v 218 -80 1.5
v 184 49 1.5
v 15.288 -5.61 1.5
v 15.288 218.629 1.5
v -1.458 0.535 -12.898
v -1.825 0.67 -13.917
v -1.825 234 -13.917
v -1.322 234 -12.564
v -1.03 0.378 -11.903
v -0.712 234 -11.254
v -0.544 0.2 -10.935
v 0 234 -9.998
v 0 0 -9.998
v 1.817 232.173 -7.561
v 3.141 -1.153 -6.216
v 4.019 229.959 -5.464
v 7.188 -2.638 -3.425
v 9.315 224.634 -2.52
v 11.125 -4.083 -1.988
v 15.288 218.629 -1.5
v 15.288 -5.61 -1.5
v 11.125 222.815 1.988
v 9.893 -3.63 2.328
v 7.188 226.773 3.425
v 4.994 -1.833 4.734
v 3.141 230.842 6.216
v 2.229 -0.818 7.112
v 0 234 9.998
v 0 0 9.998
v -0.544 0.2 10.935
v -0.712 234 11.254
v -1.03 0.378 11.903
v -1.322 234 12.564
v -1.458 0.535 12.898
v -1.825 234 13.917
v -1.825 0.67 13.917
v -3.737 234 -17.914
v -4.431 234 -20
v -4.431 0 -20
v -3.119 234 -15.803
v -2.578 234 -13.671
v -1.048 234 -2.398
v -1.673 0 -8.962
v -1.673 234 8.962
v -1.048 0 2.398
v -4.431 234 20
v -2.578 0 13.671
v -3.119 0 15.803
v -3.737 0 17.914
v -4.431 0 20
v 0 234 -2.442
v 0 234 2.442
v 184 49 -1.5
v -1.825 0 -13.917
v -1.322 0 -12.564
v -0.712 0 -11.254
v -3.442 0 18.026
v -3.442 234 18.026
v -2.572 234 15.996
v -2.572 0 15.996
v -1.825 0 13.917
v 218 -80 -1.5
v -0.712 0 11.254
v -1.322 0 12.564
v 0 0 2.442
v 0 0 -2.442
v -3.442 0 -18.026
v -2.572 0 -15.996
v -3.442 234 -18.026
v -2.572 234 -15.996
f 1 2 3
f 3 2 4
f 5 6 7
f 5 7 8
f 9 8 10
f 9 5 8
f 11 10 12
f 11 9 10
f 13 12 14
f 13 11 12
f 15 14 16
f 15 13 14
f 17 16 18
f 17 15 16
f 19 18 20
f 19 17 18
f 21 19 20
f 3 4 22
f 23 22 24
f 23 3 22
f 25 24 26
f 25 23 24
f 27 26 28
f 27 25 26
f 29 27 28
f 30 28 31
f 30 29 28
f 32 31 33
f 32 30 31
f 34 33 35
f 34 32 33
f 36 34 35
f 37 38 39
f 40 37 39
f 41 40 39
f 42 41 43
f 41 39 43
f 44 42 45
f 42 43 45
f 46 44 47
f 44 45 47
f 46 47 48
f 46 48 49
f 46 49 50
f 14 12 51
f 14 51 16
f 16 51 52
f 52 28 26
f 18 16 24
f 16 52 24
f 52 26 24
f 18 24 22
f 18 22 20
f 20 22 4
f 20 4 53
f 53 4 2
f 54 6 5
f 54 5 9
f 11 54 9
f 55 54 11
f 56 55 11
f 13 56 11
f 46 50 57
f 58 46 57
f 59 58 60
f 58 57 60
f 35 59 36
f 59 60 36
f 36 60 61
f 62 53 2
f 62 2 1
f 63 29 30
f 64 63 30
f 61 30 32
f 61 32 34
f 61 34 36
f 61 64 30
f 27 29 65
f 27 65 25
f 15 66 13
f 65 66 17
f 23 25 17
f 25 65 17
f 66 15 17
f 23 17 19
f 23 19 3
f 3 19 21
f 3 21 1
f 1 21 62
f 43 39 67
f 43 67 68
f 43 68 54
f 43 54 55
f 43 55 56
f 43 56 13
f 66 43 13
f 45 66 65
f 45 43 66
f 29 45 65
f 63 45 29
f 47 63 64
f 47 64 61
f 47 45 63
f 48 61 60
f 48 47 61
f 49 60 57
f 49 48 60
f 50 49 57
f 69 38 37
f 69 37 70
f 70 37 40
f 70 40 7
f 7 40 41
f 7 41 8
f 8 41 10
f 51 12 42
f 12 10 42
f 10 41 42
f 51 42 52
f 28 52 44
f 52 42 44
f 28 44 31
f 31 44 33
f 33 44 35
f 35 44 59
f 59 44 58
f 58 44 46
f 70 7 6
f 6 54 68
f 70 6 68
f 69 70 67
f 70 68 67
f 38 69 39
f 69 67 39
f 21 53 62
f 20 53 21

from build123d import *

# Parameters (mm, degrees)
BOSS_EXTRUDE1_DEPTH      = 1.5
BOSS_EXTRUDE1_DEPTH_BACK = 1.5
BOSS_EXTRUDE2_DEPTH      = 234
FILLET1_R                = 37
FILLET2_R                = 37
FILLET3_R                = 18
FILLET4_R                = 18


with BuildPart() as part:
    # Sketch1 → Boss-Extrude1 (new, two sides: drawn at the far end of the back side and taken through both)
    with BuildSketch(Plane.XY.offset(-BOSS_EXTRUDE1_DEPTH_BACK)):
        Polygon((0, 0), (0, 234), (184, 49), (218, -80), align=None)
    extrude(amount=BOSS_EXTRUDE1_DEPTH + BOSS_EXTRUDE1_DEPTH_BACK)

    # Sketch3 → Boss-Extrude2 (add)
    with BuildSketch(Plane(origin=(0, 0, 0), x_dir=(1, 0, 0), z_dir=(0, 1, 0))):
        with BuildLine():
            Line((0, 0), (0, 20))
            Line((0, 20), (-4.431457505, 20))
            ThreePointArc((-4.431457505, 20), (-1, 0), (-4.431457505, -20))
            Line((-4.431457505, -20), (0, -20))
            Line((0, -20), (0, 0))
        make_face()
    extrude(amount=BOSS_EXTRUDE2_DEPTH)

    # Fillet1
    # the kernel refuses this fillet: 37 mm, written as the material it takes off along each edge
    with BuildSketch(Plane(origin=(0, -43.895475262, -20), x_dir=(-1, 0, 0), z_dir=(0, 1, 0))) as fillet1_piece_1:
        with BuildLine():
            CenterArc((37, 17.558190105), FILLET1_R, 180, 28.329773325)
            Line((0, 17.558190105), (-0.74, 17.558190105))
            Line((-0.74, 17.558190105), (-0.74, 0))
            Line((-0.74, 0), (0, -0.74))
            ThreePointArc((0, -0.74), (2.215728753, -0.74), (3.780086655, -0.351163802))
            Line((3.780086655, -0.351163802), (4.431457505, 0))
        make_face()
    extrude(amount=321.790950524, mode=Mode.SUBTRACT)

    # Fillet2
    # the kernel refuses this fillet: 37 mm, written as the material it takes off along each edge
    with BuildSketch(Plane(origin=(0, -43.895475262, 20), x_dir=(-1, 0, 0), z_dir=(0, 1, 0))) as fillet2_piece_1:
        with BuildLine():
            CenterArc((37, -17.558190105), FILLET2_R, 151.670226675, 28.329773325)
            Line((0, -17.558190105), (-0.74, -17.558190105))
            Line((-0.74, -17.558190105), (-0.74, 0))
            Line((-0.74, 0), (0, 0.74))
            ThreePointArc((0, 0.74), (2.215728753, 0.74), (3.780086655, 0.351163802))
            Line((3.780086655, 0.351163802), (4.431457505, 0))
        make_face()
    extrude(amount=321.790950524, mode=Mode.SUBTRACT)

    # Fillet3
    # the kernel refuses this fillet: 18 mm, written as the material it adds along each edge
    with BuildSketch(Plane(origin=(0, -38.219598529, 1.5), x_dir=(-0.1453745067000553, 0, 0.9893766991402797), z_dir=(0, 1, 0))) as fillet3_piece_1_section:
        with BuildLine():
            CenterArc((15.586318472, 17.742173215), FILLET3_R, 188.358966638, 71.931795215)
            Line((-2.222462113, 15.125432094), (-4.003340171, 14.863757982))
            Line((-4.003340171, 14.863757982), (-1.780878058, -0.261674112))
            Line((-1.780878058, -0.261674112), (0.261674112, -1.780878058))
            ThreePointArc((0.261674112, -1.780878058), (1.193478877, -1.64396291), (12.247081967, -1.774217321))
            Line((12.247081967, -1.774217321), (12.550648922, 0))
        make_face()
    fillet3_piece_1 = extrude(amount=272.219598529, mode=Mode.PRIVATE)
    fillet3_piece_1 = fillet3_piece_1 - Plane(origin=(-61, -0.93503603, 0), x_dir=(0.9428090415820632, 0, -0.3333333333333337), z_dir=(0, -1, 0)) * Cylinder(60, 605, mode=Mode.PRIVATE)
    fillet3_piece_1 = split(fillet3_piece_1, bisect_by=Plane(origin=(6.052795765, -2.221209455, 3.73592086), z_dir=(0.34450770303612605, 0.9387834907734437, 0)), keep=Keep.TOP, mode=Mode.PRIVATE)
    fillet3_piece_1 = split(fillet3_piece_1, bisect_by=Plane(origin=(120.710503396, 112.633461259, 3.73592086), z_dir=(-0.7090204561204898, -0.7051879131144355, 0)), keep=Keep.TOP, mode=Mode.PRIVATE)
    add(fillet3_piece_1)
    with BuildSketch(Plane(origin=(0, 0, 1.5), x_dir=(-0.14537450670005528, 0, 0.9893766991402797), z_dir=(0, 1, 0))) as fillet3_piece_2_section:
        with BuildLine():
            CenterArc((15.586318472, 17.742173215), FILLET3_R, 188.358966638, 71.931795215)
            Line((-2.222462113, 15.125432094), (-4.003340171, 14.863757982))
            Line((-4.003340171, 14.863757982), (-1.780878058, -0.261674112))
            Line((-1.780878058, -0.261674112), (0.261674112, -1.780878058))
            ThreePointArc((0.261674112, -1.780878058), (1.193478877, -1.64396291), (12.247081967, -1.774217321))
            Line((12.247081967, -1.774217321), (12.550648922, 0))
        make_face()
    fillet3_piece_2 = extrude(amount=272.219598529, mode=Mode.PRIVATE)
    fillet3_piece_2 = fillet3_piece_2 - Plane(origin=(-61, 0.334778788, 0), x_dir=(0.9428090415820632, 0, -0.3333333333333337), z_dir=(0, -1, 0)) * Cylinder(60, 605, mode=Mode.PRIVATE)
    fillet3_piece_2 = split(fillet3_piece_2, bisect_by=Plane(origin=(-1.045097549, 0.383522036, 11.887652285), z_dir=(-0.34450770303612605, -0.9387834907734437, 0)), keep=Keep.TOP, mode=Mode.PRIVATE)
    add(fillet3_piece_2)

    # Fillet4
    # the kernel refuses this fillet: 18 mm, written as the material it adds along each edge
    with BuildSketch(Plane(origin=(0, -38.219598529, -1.5), x_dir=(-0.14537450670005567, 0, -0.9893766991402797), z_dir=(0, 1, 0))) as fillet4_piece_1_section:
        with BuildLine():
            CenterArc((15.586318472, -17.742173215), FILLET4_R, 99.709238147, 71.931795215)
            Line((-2.222462113, -15.125432094), (-4.003340171, -14.863757982))
            Line((-4.003340171, -14.863757982), (-1.780878058, 0.261674112))
            Line((-1.780878058, 0.261674112), (0.261674112, 1.780878058))
            ThreePointArc((0.261674112, 1.780878058), (1.193478877, 1.64396291), (12.247081967, 1.774217321))
            Line((12.247081967, 1.774217321), (12.550648922, 0))
        make_face()
    fillet4_piece_1 = extrude(amount=272.219598529, mode=Mode.PRIVATE)
    fillet4_piece_1 = fillet4_piece_1 - Plane(origin=(-61, -0.93503603, 0), x_dir=(0.9428090415820632, 0, -0.3333333333333337), z_dir=(0, -1, 0)) * Cylinder(60, 605, mode=Mode.PRIVATE)
    fillet4_piece_1 = split(fillet4_piece_1, bisect_by=Plane(origin=(120.710503396, 112.633461259, -3.73592086), z_dir=(-0.709020456120464, -0.7051879131144615, 0)), keep=Keep.TOP, mode=Mode.PRIVATE)
    fillet4_piece_1 = split(fillet4_piece_1, bisect_by=Plane(origin=(6.052795765, -2.221209455, -3.73592086), z_dir=(0.34450770303615846, 0.9387834907734318, 0)), keep=Keep.TOP, mode=Mode.PRIVATE)
    add(fillet4_piece_1)
    with BuildSketch(Plane(origin=(0, 0, -1.5), x_dir=(-0.1453745067000557, 0, -0.9893766991402797), z_dir=(0, 1, 0))) as fillet4_piece_2_section:
        with BuildLine():
            CenterArc((15.586318472, -17.742173215), FILLET4_R, 99.709238147, 71.931795215)
            Line((-2.222462113, -15.125432094), (-4.003340171, -14.863757982))
            Line((-4.003340171, -14.863757982), (-1.780878058, 0.261674112))
            Line((-1.780878058, 0.261674112), (0.261674112, 1.780878058))
            ThreePointArc((0.261674112, 1.780878058), (1.193478877, 1.64396291), (12.247081967, 1.774217321))
            Line((12.247081967, 1.774217321), (12.550648922, 0))
        make_face()
    fillet4_piece_2 = extrude(amount=272.219598529, mode=Mode.PRIVATE)
    fillet4_piece_2 = fillet4_piece_2 - Plane(origin=(-61, 0.334778788, 0), x_dir=(0.9428090415820632, 0, -0.3333333333333337), z_dir=(0, -1, 0)) * Cylinder(60, 605, mode=Mode.PRIVATE)
    fillet4_piece_2 = split(fillet4_piece_2, bisect_by=Plane(origin=(-1.045097549, 0.383522036, -11.887652285), z_dir=(-0.34450770303615846, -0.9387834907734318, 0)), keep=Keep.TOP, mode=Mode.PRIVATE)
    add(fillet4_piece_2)


solid = part.part
